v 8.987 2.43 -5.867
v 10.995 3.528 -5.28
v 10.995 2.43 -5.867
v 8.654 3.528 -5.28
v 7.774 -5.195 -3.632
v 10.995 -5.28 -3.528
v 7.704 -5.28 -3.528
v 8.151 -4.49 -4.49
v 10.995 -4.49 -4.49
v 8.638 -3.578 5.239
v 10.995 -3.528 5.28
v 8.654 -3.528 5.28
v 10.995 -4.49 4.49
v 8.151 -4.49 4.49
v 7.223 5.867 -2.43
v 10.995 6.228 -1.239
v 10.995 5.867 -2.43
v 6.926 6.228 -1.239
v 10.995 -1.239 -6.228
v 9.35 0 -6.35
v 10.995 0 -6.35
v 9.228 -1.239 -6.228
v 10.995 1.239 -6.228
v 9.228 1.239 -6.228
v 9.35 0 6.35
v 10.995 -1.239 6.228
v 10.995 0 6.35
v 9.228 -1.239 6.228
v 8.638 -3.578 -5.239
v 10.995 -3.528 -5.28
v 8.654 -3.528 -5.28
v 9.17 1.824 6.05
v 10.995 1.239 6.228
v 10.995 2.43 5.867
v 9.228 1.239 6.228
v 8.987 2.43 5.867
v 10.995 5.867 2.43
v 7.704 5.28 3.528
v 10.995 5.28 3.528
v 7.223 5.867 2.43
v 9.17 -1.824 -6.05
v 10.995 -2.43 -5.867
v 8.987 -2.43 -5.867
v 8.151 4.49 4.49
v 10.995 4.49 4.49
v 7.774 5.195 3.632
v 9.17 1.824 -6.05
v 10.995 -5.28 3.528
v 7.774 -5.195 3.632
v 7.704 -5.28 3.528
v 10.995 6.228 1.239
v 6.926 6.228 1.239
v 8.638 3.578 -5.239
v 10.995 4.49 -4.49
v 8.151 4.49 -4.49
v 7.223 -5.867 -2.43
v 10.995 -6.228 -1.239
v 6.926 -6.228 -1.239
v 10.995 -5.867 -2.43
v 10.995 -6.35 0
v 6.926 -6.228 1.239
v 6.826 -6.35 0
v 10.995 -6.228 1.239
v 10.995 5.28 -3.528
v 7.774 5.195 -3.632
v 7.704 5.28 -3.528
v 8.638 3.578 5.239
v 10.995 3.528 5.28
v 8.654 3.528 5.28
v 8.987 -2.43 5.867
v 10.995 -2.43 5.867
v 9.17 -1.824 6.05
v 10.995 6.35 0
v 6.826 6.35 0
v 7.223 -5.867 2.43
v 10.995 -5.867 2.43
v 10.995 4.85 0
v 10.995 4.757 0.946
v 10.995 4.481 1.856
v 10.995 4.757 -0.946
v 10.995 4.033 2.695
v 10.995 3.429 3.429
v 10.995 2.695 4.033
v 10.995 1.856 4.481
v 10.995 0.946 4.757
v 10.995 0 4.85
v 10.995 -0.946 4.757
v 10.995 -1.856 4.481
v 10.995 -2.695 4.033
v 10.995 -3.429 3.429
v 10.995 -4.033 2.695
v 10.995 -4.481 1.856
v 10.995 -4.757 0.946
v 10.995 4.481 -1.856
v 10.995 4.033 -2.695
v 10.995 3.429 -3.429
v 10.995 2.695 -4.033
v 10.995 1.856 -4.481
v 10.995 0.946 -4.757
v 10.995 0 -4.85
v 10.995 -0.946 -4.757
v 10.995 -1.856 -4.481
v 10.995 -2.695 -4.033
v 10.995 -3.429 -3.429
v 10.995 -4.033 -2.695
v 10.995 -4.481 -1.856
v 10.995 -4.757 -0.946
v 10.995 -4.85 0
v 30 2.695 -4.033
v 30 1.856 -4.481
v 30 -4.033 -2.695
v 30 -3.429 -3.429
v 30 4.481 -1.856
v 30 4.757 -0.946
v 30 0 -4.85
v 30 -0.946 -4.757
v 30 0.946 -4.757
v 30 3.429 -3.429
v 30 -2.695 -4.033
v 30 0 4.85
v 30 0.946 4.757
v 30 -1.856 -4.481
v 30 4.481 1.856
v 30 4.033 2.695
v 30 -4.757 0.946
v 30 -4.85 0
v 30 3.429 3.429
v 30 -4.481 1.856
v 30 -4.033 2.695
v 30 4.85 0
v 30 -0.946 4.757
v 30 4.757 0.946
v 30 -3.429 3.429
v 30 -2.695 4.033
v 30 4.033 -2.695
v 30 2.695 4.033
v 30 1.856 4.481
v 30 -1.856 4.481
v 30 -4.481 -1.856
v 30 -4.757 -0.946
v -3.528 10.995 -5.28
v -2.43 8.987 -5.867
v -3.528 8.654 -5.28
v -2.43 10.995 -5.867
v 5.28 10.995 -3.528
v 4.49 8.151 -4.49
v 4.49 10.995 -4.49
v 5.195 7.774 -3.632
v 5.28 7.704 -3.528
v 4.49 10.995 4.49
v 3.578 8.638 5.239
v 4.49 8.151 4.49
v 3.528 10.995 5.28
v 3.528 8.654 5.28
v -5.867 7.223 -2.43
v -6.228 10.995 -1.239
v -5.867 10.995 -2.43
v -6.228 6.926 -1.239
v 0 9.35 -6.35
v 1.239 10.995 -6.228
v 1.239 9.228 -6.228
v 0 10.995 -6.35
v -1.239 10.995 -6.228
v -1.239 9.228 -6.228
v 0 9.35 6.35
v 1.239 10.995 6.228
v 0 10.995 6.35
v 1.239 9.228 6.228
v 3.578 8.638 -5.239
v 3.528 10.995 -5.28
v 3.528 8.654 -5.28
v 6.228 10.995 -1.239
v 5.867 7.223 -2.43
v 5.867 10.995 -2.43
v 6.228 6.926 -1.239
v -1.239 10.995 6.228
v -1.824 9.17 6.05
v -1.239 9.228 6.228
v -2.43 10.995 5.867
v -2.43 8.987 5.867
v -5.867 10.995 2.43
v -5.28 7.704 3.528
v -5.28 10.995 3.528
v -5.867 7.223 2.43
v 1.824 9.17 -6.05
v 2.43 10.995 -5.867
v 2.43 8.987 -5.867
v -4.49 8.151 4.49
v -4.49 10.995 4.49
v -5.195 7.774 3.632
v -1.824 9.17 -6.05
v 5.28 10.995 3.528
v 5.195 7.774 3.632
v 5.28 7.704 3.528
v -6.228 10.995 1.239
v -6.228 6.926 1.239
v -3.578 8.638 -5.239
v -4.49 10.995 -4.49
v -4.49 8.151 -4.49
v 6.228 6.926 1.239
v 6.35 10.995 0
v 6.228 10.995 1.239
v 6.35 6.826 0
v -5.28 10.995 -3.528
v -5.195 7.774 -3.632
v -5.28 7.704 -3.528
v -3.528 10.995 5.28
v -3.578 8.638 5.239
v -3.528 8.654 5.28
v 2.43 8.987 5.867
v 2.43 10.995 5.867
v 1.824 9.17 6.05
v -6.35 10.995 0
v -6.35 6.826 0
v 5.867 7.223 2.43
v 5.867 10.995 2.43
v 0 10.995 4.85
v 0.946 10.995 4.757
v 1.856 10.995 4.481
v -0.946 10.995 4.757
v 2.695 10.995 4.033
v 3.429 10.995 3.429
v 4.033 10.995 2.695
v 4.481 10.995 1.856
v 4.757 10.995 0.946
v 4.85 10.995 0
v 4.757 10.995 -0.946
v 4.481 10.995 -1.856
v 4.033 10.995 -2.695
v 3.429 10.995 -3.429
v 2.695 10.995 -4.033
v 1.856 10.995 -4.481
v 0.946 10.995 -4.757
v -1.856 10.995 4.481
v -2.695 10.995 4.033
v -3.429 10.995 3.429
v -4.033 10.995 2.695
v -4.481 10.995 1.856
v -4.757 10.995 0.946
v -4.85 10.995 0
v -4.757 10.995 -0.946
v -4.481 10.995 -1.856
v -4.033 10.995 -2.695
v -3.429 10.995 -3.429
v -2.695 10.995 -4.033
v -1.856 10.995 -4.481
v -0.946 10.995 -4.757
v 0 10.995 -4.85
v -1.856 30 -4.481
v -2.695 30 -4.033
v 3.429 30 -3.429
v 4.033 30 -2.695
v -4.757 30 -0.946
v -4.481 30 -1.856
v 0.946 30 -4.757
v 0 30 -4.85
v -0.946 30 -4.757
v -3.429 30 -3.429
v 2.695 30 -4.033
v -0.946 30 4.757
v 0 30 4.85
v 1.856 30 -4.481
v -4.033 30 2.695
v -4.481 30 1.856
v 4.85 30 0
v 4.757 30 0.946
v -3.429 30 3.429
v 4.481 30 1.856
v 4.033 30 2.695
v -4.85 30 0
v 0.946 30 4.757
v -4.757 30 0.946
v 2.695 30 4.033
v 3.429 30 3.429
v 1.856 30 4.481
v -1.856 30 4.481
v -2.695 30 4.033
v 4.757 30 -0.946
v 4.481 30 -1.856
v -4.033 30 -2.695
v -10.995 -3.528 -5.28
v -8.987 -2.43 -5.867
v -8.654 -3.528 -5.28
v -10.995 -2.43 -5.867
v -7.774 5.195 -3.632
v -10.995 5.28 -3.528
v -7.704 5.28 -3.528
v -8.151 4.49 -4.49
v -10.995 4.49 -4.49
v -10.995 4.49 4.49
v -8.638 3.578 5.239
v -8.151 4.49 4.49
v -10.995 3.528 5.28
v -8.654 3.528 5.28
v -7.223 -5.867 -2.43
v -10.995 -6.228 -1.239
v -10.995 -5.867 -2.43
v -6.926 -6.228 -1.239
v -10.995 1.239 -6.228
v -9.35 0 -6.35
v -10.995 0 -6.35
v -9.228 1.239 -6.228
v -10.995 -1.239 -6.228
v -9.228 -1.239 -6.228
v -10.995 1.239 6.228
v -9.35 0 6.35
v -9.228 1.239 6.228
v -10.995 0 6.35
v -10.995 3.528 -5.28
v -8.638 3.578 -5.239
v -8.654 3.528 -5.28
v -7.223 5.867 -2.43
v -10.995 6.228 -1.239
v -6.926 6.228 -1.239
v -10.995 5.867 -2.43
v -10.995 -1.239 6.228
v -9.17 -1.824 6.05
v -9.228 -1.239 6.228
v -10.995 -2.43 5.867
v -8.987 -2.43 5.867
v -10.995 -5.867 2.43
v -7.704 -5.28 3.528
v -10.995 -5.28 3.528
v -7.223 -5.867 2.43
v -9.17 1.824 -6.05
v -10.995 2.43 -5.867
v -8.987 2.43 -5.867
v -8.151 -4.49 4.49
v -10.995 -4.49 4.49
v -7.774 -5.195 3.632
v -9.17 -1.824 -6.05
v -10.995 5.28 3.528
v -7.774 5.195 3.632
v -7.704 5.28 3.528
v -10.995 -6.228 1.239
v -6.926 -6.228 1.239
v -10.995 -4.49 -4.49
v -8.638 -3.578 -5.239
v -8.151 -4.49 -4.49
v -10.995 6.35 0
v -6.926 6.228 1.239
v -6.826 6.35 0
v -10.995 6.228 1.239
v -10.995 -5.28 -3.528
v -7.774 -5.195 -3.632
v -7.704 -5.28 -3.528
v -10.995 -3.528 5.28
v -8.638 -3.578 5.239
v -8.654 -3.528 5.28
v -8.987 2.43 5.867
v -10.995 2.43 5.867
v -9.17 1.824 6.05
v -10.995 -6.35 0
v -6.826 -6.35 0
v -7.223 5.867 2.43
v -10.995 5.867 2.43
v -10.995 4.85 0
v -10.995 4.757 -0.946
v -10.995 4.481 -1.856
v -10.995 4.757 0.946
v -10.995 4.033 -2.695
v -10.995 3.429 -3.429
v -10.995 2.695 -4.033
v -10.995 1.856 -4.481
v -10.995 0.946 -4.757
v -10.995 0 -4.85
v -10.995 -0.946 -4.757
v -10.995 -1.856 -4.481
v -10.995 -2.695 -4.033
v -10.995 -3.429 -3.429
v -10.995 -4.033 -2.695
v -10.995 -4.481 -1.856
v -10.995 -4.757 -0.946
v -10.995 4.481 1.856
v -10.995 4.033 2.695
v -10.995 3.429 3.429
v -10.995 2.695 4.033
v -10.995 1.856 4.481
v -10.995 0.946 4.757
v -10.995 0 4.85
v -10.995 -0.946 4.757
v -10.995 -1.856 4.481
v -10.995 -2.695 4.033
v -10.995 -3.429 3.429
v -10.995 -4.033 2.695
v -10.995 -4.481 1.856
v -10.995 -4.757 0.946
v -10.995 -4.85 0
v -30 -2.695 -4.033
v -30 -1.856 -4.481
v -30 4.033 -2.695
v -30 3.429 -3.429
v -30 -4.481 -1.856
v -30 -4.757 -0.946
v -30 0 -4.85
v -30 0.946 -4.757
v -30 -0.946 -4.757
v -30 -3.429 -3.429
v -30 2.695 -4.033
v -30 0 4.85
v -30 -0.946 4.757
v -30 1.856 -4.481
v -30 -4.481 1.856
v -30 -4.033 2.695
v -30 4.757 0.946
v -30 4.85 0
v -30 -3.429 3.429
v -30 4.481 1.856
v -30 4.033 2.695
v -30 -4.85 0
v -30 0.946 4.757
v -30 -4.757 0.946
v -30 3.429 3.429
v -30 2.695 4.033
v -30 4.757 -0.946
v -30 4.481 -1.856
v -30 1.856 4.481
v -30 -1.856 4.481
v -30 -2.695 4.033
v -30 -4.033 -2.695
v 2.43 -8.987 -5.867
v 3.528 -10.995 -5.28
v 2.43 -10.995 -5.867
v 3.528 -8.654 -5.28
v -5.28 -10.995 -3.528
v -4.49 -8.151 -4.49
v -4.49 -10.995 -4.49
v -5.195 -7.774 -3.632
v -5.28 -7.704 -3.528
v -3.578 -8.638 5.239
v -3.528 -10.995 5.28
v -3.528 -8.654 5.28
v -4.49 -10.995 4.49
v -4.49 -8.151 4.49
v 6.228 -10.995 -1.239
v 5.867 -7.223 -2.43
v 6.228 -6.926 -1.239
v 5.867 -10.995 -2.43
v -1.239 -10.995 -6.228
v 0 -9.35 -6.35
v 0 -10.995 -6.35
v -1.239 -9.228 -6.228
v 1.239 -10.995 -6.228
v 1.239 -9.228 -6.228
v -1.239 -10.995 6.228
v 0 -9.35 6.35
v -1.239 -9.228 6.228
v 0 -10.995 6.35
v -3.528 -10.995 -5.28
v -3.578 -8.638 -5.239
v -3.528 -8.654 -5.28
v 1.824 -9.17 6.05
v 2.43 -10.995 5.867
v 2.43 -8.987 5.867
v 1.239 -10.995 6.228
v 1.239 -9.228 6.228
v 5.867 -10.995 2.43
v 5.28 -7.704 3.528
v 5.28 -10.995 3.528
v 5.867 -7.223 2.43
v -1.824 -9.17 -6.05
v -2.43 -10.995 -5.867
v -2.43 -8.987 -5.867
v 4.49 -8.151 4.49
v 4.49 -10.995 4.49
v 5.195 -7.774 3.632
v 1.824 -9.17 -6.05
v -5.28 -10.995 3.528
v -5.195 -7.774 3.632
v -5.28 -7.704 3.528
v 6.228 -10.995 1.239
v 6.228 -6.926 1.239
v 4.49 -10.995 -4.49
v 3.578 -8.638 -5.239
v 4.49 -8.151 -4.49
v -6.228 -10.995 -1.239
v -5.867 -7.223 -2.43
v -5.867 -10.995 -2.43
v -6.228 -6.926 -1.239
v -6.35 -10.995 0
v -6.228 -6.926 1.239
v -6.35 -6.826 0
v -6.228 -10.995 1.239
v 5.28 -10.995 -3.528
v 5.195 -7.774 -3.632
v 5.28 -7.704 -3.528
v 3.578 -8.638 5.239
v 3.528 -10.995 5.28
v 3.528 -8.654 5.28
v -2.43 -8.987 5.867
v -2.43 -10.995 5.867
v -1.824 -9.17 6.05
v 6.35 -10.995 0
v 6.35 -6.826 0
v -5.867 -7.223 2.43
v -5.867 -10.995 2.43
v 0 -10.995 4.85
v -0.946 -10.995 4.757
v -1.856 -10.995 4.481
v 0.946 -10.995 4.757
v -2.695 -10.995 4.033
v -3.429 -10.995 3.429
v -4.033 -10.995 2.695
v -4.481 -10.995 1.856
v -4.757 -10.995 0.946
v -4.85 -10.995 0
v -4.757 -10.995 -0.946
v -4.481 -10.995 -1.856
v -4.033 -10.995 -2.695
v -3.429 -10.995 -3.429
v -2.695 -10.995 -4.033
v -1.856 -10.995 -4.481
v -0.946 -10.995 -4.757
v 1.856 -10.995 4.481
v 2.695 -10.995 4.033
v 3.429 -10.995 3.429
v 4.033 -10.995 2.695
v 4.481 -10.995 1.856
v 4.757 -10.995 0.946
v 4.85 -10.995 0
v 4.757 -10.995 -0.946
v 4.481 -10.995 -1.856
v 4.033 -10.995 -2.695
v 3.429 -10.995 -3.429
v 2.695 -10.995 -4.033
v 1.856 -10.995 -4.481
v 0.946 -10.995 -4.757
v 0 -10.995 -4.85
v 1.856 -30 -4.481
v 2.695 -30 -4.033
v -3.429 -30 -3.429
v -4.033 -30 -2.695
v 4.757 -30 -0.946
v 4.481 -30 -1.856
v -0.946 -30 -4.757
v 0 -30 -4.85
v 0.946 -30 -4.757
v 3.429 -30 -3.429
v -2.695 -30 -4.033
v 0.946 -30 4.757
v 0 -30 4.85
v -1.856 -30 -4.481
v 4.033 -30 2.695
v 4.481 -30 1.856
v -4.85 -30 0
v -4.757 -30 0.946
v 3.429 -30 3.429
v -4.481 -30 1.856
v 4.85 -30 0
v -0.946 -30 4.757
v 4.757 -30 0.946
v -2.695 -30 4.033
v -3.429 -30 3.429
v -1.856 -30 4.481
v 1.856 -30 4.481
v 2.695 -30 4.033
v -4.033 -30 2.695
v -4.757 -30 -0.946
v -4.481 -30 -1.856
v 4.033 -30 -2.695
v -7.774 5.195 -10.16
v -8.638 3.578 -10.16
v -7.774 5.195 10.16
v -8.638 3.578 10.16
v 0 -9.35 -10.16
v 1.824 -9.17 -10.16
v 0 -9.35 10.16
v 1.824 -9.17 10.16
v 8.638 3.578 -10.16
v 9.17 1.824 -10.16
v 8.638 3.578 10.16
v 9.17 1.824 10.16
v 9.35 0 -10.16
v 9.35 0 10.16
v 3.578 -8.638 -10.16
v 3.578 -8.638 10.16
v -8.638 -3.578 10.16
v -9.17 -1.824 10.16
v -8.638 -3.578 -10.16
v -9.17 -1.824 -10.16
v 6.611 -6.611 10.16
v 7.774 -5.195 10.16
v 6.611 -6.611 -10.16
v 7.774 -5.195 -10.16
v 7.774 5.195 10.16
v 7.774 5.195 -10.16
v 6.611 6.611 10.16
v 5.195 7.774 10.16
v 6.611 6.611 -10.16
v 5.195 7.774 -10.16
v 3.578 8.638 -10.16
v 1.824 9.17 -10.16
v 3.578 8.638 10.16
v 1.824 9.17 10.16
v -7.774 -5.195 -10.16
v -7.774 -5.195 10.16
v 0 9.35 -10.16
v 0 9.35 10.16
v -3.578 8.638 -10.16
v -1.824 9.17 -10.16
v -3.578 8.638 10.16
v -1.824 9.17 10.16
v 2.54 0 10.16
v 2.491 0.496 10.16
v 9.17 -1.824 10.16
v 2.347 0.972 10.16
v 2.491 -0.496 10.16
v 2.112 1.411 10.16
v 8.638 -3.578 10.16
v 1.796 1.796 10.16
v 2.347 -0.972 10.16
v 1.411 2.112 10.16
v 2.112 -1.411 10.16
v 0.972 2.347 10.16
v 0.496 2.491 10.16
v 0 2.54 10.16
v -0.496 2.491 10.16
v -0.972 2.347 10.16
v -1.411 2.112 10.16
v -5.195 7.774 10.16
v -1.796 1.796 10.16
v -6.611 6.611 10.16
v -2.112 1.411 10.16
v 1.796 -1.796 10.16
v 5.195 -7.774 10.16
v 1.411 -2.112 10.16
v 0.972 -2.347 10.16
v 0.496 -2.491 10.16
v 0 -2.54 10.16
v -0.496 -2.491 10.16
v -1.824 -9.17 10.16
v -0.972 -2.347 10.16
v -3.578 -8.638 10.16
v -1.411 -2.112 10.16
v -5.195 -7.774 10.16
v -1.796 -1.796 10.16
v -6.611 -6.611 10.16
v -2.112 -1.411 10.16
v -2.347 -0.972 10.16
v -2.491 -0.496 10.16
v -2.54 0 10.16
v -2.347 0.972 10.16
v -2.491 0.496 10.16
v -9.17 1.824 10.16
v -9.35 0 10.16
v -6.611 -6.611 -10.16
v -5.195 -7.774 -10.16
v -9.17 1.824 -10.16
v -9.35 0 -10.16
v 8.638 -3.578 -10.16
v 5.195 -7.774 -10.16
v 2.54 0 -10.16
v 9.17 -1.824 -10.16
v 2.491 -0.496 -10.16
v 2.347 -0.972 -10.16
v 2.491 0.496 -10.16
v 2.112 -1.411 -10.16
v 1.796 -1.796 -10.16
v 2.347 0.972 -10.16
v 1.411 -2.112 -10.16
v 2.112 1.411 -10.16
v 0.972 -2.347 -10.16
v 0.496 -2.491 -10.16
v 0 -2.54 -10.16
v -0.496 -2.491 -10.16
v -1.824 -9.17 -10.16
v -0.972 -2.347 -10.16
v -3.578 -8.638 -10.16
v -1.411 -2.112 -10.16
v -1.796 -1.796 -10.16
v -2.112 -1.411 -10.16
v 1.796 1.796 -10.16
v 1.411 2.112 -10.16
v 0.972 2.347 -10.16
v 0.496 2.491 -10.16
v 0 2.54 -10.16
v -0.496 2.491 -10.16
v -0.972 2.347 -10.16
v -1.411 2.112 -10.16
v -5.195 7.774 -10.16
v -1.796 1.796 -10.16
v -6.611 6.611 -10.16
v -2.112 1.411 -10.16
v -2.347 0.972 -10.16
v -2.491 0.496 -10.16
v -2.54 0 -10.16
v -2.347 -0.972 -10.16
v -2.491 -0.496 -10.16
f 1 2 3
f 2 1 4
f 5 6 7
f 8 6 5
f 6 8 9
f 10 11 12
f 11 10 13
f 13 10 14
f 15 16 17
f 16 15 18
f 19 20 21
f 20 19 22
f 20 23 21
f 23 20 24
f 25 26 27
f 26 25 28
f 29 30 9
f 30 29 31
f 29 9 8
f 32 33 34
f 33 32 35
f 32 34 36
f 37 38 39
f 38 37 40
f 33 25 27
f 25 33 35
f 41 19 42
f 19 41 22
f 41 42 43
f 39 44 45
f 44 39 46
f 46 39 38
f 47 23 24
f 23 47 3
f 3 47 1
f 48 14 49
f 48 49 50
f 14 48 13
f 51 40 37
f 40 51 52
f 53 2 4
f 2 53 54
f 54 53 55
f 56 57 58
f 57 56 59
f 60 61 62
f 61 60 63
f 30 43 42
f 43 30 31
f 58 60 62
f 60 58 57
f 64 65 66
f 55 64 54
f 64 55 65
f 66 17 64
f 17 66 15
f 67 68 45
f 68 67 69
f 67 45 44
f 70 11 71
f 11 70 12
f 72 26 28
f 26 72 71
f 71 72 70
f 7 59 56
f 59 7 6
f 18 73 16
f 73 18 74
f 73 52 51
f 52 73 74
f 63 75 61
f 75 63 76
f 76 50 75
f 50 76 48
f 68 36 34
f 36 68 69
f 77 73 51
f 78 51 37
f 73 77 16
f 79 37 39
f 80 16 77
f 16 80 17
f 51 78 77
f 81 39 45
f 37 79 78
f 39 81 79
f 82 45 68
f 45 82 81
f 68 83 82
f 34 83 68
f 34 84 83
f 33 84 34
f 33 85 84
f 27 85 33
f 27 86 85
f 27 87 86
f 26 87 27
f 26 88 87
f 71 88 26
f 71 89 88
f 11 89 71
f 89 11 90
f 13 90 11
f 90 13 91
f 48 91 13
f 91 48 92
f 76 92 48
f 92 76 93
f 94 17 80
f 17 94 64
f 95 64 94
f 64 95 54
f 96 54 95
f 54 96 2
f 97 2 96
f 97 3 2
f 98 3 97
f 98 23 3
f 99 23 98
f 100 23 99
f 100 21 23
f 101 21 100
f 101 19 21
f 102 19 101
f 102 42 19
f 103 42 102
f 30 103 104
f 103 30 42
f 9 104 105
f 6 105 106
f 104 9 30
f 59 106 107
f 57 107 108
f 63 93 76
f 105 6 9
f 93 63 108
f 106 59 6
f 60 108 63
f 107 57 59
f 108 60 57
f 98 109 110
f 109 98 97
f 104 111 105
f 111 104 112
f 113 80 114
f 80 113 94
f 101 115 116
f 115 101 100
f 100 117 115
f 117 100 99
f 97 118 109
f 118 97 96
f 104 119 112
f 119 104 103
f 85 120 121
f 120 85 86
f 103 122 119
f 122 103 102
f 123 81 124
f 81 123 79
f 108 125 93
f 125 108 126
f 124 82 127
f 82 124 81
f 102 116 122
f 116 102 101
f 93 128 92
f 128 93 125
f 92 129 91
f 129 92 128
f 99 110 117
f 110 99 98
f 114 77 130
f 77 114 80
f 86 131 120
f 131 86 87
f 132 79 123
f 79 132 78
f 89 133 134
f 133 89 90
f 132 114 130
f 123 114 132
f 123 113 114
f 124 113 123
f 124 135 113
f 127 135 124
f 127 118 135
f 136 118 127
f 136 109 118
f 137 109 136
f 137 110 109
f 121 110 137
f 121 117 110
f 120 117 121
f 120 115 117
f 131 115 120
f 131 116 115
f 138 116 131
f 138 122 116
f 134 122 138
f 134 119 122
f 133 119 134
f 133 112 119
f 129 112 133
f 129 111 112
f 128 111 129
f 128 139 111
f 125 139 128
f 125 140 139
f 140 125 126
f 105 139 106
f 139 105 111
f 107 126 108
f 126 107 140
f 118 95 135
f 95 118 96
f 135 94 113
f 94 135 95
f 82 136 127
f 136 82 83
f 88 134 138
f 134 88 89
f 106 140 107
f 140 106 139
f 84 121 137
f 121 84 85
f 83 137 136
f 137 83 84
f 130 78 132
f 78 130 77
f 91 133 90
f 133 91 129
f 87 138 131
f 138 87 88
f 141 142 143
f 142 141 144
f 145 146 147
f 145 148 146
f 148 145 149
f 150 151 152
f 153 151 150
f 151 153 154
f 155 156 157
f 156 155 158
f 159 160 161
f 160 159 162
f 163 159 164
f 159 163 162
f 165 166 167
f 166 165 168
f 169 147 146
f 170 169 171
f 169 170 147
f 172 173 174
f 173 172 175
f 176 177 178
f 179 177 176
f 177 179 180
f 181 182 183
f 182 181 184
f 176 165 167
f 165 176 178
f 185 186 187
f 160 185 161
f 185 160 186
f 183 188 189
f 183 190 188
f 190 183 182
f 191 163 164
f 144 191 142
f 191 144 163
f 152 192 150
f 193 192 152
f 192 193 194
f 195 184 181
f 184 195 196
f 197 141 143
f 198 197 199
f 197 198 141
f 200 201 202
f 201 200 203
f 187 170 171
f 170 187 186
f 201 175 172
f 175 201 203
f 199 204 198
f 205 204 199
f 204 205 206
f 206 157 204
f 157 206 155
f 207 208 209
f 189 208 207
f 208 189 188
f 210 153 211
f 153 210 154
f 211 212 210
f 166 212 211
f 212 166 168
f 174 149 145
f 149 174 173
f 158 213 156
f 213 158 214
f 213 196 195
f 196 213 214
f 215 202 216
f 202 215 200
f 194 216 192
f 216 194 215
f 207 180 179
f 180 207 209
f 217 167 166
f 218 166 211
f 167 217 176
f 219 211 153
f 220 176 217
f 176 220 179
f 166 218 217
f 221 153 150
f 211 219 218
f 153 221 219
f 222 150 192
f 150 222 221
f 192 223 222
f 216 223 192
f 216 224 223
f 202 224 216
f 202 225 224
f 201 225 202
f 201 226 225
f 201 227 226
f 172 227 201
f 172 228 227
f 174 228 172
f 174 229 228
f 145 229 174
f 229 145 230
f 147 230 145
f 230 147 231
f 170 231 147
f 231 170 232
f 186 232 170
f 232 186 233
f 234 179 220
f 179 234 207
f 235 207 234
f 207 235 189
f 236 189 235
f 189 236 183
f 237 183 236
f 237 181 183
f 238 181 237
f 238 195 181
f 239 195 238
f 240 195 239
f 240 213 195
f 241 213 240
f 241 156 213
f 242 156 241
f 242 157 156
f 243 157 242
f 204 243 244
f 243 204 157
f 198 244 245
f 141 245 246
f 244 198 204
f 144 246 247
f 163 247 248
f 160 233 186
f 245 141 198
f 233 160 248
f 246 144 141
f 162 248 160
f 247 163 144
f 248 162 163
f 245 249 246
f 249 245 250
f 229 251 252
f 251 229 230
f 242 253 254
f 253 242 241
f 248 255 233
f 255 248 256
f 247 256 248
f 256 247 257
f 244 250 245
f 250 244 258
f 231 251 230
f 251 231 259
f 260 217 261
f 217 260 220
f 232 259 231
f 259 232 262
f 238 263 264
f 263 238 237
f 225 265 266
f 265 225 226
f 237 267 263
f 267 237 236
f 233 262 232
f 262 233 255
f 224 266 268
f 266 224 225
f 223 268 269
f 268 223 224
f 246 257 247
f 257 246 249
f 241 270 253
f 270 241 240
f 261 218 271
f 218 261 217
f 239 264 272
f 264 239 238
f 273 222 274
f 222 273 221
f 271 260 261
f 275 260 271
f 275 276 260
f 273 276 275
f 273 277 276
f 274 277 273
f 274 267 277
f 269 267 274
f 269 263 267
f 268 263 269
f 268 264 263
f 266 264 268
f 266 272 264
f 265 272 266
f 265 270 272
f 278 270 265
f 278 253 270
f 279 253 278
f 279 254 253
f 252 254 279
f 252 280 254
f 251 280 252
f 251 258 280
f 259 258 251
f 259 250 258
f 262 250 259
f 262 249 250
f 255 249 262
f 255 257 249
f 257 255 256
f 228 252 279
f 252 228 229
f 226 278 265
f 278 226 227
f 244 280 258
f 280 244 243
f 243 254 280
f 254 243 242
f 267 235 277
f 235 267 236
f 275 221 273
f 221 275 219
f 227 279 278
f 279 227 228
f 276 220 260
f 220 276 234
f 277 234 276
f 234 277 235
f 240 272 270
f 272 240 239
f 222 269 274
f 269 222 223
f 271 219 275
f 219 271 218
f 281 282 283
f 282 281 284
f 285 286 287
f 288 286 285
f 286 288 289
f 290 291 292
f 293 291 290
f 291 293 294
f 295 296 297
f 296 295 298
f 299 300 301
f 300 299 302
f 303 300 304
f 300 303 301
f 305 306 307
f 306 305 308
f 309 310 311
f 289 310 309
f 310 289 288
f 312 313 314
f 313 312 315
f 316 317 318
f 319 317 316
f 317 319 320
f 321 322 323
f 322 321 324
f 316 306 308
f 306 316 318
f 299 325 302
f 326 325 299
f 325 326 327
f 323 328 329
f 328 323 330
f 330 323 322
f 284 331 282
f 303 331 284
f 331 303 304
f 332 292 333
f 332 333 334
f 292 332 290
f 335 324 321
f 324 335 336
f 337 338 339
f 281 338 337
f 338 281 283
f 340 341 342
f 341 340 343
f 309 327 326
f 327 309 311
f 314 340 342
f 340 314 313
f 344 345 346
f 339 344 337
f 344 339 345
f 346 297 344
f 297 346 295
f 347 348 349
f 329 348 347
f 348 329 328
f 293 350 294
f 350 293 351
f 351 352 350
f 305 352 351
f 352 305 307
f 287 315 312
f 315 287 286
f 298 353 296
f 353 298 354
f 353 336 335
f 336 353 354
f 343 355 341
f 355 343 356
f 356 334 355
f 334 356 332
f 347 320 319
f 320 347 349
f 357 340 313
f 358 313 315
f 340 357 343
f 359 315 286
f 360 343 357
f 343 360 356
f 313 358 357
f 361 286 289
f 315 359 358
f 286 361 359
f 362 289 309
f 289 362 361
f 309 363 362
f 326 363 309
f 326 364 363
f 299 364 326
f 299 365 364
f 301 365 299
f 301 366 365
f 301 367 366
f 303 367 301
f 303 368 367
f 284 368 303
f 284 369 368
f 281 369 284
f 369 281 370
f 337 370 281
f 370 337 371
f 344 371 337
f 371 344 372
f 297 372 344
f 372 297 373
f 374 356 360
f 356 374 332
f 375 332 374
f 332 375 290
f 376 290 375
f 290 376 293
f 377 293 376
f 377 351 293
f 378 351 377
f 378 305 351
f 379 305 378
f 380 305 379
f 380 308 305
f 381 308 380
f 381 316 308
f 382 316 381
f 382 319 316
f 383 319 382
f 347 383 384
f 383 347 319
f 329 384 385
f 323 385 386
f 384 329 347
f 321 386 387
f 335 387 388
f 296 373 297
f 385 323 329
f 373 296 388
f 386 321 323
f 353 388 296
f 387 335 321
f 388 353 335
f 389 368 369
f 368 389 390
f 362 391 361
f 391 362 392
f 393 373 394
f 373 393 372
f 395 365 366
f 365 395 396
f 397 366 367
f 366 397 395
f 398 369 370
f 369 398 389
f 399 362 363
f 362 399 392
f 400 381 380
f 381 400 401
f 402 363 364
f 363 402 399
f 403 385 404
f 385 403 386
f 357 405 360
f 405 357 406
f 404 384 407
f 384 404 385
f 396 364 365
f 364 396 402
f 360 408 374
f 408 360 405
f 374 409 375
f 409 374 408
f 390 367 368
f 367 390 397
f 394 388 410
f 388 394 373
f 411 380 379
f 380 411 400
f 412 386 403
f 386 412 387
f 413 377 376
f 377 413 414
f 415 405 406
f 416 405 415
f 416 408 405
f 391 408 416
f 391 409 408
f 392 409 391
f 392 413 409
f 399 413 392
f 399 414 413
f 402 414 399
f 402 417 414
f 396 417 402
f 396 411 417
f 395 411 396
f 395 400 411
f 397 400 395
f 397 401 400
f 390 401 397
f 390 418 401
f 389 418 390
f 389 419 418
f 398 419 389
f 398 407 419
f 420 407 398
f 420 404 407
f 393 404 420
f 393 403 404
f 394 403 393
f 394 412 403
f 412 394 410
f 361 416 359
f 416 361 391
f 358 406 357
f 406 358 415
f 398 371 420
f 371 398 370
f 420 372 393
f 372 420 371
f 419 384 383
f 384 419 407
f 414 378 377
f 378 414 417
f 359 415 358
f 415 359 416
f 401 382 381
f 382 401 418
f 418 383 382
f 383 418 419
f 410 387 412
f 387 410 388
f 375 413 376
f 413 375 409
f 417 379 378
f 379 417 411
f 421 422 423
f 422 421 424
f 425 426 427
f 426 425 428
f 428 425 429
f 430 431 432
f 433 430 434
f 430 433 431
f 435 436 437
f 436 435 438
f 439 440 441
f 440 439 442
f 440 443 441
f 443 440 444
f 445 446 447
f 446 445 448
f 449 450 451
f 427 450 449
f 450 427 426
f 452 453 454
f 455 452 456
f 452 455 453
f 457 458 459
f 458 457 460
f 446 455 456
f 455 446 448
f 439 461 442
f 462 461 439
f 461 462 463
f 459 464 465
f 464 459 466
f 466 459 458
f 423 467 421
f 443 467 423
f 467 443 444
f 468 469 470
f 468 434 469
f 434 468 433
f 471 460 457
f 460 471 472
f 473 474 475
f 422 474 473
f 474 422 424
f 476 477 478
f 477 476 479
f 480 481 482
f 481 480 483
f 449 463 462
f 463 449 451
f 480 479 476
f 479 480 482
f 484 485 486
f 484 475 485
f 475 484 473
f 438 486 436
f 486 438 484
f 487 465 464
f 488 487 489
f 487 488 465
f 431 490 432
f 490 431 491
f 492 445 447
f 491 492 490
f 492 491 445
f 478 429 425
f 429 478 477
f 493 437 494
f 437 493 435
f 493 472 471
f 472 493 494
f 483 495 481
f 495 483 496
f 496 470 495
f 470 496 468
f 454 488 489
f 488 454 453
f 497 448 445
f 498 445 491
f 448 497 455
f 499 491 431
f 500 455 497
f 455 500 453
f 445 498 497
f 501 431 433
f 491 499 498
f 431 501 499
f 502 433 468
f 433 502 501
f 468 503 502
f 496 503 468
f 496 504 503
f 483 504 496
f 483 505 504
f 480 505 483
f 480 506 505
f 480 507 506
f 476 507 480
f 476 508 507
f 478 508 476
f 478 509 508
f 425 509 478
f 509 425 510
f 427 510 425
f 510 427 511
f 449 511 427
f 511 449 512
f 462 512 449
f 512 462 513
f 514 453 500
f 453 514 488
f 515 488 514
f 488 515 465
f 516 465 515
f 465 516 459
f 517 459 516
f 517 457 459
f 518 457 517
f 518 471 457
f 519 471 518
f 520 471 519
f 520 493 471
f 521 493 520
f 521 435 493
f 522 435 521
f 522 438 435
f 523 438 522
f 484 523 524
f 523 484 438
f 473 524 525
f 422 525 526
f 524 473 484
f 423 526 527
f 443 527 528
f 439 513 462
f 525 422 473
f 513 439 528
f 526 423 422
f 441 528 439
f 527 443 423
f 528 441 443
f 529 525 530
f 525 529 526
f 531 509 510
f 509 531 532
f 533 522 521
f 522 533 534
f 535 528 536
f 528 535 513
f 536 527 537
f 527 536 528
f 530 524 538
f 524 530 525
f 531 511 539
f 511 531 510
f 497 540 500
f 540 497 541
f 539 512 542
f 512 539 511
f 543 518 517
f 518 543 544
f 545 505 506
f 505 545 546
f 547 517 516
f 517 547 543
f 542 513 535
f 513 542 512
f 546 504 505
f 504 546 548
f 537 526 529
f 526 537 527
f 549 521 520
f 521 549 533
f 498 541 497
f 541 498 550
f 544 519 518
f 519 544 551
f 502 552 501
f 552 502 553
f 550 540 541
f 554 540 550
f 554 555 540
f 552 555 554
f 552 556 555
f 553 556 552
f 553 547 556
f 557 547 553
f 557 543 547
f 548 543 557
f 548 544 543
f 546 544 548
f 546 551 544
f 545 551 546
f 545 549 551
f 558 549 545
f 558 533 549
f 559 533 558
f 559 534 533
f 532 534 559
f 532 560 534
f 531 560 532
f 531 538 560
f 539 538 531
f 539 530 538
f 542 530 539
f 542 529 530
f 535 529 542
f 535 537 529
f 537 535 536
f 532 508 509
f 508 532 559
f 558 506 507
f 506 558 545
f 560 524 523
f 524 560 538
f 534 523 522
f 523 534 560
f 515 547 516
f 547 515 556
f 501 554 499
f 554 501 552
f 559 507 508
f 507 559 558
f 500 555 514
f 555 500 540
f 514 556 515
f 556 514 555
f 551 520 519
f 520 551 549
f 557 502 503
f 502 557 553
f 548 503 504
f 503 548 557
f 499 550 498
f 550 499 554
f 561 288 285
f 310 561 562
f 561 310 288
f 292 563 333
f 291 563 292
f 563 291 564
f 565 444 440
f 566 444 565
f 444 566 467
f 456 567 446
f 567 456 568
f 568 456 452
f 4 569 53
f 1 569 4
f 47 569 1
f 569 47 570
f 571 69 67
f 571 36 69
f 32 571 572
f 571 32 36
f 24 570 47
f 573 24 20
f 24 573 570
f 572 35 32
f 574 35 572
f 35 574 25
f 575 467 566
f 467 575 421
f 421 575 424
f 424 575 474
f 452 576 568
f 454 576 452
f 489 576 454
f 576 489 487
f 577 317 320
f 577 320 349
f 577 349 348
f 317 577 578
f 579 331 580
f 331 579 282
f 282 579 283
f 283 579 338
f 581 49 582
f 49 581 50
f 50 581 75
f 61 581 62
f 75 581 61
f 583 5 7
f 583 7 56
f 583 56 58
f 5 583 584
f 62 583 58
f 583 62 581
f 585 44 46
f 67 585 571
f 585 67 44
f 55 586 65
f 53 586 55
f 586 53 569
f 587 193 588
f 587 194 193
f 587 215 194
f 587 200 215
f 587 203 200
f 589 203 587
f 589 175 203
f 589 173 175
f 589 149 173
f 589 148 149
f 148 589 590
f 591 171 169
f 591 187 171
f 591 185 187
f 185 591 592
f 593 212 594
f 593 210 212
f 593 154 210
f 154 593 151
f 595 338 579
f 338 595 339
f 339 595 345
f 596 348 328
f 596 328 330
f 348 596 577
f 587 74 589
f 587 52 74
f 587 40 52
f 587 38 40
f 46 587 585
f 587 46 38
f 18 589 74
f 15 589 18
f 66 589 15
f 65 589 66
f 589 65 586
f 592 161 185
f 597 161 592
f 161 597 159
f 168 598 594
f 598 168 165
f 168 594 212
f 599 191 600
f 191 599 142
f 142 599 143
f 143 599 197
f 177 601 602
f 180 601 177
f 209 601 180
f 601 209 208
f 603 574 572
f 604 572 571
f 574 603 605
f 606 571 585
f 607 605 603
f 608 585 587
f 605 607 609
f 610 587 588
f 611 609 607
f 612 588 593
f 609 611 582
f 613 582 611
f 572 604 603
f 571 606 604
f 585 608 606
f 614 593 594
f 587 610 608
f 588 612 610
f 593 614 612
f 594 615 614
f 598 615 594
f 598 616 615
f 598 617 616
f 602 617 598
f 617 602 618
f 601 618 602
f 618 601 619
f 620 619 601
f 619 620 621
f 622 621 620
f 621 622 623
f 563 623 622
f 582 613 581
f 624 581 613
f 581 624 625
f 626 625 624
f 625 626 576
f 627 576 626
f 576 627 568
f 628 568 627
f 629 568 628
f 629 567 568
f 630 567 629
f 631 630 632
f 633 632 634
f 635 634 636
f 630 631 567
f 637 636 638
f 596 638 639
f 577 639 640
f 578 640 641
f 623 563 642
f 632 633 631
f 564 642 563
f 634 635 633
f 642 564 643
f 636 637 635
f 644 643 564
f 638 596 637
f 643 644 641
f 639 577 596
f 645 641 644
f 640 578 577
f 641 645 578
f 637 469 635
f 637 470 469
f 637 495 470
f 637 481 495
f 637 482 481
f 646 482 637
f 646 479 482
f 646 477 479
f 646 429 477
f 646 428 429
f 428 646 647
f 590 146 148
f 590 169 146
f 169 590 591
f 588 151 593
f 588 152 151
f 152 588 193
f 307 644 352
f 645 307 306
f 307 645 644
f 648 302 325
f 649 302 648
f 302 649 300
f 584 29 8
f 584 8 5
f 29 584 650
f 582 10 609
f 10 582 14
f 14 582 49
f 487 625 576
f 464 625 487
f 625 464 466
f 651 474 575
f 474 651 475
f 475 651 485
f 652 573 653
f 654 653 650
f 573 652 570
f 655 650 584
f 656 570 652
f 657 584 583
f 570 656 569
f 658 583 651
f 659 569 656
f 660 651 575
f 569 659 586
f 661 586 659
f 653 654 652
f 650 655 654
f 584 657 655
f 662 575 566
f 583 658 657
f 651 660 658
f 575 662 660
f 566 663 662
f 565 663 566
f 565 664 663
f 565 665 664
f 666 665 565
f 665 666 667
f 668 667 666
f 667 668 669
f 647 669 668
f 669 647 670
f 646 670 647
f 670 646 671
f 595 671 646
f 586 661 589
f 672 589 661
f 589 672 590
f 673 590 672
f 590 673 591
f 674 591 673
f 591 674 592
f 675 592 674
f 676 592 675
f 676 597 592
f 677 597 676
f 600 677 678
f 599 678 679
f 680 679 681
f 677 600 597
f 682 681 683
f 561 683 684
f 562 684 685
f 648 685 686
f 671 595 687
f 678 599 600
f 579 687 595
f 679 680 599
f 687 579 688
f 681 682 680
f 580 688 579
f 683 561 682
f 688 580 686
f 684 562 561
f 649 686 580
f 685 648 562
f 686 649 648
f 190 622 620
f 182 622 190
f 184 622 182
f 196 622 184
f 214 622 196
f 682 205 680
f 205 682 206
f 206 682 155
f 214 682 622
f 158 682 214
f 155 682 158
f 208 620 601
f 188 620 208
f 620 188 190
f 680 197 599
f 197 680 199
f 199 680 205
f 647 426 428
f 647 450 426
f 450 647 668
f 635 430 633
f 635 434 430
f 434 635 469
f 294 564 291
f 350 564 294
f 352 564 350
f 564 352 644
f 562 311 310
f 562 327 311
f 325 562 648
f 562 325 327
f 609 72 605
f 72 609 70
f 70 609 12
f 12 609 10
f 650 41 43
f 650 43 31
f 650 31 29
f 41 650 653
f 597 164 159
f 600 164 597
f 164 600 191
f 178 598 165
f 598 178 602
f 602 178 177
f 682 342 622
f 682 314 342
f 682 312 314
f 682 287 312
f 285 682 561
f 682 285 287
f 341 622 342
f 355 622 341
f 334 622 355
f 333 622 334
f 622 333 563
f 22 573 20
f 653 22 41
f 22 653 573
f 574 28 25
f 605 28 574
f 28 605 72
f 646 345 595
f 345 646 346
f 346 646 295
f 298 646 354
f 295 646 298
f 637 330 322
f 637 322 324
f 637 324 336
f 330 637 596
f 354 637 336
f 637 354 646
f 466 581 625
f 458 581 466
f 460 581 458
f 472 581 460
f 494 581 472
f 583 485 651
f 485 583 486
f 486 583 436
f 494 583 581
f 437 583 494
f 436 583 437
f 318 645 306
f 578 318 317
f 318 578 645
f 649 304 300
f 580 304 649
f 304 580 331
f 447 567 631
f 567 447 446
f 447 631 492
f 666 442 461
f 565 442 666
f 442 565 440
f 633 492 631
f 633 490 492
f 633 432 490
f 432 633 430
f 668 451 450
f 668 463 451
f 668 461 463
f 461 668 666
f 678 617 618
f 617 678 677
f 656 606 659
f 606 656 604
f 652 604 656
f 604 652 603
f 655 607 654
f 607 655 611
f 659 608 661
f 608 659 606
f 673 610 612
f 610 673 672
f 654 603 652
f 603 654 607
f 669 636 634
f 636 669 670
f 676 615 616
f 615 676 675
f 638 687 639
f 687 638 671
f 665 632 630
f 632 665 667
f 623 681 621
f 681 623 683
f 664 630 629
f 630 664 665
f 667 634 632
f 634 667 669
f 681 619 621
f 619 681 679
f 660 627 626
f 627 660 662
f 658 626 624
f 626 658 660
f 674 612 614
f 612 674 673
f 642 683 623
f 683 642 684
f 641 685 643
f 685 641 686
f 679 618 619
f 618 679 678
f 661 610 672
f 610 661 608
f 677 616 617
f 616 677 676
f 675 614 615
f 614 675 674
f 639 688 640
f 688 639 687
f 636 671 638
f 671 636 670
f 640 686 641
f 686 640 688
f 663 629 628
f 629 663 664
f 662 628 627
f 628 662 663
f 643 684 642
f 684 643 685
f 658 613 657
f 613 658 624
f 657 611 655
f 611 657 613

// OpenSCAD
$fn = 32;

// ----------------------------------------------------------------------
// Cardan cross: 60 mm span, 12.7 mm trunnions
// ----------------------------------------------------------------------

// --- parameters (mm) ---
journal_d = 12.7;         // trunnion diameter
arm_len = 30;             // trunnion length from the centre
step_r = 4.32;            // step position from the centre
step_d = 9.7;             // journal diameter after the step
hub_d = 18.7;             // hub diameter
hub_h = 20.32;            // hub height
bore_d = 5.08;            // hub bore

difference() {
  union() {
    /* hub along the joint axis */
    cylinder(h = hub_h, d = hub_d, center = true);
    for (a = [0 : 90 : 270]) rotate([0, 0, a]) {
      /* trunnion, sunk into the hub */
      translate([hub_d / 4, 0, 0]) rotate([0, 90, 0]) cylinder(h = step_r + 2, d = journal_d);
      /* stepped journal out to the tip */
      translate([step_r - 0.5, 0, 0]) rotate([0, 90, 0]) cylinder(h = arm_len + 0.5 - step_r, d = step_d);
    }
  }
  /* lubrication bore through the hub, 2.5 mm clear on both sides */
  translate([0, 0, -hub_h / 2 - 2.5]) cylinder(h = hub_h + 5, d = bore_d);
}
